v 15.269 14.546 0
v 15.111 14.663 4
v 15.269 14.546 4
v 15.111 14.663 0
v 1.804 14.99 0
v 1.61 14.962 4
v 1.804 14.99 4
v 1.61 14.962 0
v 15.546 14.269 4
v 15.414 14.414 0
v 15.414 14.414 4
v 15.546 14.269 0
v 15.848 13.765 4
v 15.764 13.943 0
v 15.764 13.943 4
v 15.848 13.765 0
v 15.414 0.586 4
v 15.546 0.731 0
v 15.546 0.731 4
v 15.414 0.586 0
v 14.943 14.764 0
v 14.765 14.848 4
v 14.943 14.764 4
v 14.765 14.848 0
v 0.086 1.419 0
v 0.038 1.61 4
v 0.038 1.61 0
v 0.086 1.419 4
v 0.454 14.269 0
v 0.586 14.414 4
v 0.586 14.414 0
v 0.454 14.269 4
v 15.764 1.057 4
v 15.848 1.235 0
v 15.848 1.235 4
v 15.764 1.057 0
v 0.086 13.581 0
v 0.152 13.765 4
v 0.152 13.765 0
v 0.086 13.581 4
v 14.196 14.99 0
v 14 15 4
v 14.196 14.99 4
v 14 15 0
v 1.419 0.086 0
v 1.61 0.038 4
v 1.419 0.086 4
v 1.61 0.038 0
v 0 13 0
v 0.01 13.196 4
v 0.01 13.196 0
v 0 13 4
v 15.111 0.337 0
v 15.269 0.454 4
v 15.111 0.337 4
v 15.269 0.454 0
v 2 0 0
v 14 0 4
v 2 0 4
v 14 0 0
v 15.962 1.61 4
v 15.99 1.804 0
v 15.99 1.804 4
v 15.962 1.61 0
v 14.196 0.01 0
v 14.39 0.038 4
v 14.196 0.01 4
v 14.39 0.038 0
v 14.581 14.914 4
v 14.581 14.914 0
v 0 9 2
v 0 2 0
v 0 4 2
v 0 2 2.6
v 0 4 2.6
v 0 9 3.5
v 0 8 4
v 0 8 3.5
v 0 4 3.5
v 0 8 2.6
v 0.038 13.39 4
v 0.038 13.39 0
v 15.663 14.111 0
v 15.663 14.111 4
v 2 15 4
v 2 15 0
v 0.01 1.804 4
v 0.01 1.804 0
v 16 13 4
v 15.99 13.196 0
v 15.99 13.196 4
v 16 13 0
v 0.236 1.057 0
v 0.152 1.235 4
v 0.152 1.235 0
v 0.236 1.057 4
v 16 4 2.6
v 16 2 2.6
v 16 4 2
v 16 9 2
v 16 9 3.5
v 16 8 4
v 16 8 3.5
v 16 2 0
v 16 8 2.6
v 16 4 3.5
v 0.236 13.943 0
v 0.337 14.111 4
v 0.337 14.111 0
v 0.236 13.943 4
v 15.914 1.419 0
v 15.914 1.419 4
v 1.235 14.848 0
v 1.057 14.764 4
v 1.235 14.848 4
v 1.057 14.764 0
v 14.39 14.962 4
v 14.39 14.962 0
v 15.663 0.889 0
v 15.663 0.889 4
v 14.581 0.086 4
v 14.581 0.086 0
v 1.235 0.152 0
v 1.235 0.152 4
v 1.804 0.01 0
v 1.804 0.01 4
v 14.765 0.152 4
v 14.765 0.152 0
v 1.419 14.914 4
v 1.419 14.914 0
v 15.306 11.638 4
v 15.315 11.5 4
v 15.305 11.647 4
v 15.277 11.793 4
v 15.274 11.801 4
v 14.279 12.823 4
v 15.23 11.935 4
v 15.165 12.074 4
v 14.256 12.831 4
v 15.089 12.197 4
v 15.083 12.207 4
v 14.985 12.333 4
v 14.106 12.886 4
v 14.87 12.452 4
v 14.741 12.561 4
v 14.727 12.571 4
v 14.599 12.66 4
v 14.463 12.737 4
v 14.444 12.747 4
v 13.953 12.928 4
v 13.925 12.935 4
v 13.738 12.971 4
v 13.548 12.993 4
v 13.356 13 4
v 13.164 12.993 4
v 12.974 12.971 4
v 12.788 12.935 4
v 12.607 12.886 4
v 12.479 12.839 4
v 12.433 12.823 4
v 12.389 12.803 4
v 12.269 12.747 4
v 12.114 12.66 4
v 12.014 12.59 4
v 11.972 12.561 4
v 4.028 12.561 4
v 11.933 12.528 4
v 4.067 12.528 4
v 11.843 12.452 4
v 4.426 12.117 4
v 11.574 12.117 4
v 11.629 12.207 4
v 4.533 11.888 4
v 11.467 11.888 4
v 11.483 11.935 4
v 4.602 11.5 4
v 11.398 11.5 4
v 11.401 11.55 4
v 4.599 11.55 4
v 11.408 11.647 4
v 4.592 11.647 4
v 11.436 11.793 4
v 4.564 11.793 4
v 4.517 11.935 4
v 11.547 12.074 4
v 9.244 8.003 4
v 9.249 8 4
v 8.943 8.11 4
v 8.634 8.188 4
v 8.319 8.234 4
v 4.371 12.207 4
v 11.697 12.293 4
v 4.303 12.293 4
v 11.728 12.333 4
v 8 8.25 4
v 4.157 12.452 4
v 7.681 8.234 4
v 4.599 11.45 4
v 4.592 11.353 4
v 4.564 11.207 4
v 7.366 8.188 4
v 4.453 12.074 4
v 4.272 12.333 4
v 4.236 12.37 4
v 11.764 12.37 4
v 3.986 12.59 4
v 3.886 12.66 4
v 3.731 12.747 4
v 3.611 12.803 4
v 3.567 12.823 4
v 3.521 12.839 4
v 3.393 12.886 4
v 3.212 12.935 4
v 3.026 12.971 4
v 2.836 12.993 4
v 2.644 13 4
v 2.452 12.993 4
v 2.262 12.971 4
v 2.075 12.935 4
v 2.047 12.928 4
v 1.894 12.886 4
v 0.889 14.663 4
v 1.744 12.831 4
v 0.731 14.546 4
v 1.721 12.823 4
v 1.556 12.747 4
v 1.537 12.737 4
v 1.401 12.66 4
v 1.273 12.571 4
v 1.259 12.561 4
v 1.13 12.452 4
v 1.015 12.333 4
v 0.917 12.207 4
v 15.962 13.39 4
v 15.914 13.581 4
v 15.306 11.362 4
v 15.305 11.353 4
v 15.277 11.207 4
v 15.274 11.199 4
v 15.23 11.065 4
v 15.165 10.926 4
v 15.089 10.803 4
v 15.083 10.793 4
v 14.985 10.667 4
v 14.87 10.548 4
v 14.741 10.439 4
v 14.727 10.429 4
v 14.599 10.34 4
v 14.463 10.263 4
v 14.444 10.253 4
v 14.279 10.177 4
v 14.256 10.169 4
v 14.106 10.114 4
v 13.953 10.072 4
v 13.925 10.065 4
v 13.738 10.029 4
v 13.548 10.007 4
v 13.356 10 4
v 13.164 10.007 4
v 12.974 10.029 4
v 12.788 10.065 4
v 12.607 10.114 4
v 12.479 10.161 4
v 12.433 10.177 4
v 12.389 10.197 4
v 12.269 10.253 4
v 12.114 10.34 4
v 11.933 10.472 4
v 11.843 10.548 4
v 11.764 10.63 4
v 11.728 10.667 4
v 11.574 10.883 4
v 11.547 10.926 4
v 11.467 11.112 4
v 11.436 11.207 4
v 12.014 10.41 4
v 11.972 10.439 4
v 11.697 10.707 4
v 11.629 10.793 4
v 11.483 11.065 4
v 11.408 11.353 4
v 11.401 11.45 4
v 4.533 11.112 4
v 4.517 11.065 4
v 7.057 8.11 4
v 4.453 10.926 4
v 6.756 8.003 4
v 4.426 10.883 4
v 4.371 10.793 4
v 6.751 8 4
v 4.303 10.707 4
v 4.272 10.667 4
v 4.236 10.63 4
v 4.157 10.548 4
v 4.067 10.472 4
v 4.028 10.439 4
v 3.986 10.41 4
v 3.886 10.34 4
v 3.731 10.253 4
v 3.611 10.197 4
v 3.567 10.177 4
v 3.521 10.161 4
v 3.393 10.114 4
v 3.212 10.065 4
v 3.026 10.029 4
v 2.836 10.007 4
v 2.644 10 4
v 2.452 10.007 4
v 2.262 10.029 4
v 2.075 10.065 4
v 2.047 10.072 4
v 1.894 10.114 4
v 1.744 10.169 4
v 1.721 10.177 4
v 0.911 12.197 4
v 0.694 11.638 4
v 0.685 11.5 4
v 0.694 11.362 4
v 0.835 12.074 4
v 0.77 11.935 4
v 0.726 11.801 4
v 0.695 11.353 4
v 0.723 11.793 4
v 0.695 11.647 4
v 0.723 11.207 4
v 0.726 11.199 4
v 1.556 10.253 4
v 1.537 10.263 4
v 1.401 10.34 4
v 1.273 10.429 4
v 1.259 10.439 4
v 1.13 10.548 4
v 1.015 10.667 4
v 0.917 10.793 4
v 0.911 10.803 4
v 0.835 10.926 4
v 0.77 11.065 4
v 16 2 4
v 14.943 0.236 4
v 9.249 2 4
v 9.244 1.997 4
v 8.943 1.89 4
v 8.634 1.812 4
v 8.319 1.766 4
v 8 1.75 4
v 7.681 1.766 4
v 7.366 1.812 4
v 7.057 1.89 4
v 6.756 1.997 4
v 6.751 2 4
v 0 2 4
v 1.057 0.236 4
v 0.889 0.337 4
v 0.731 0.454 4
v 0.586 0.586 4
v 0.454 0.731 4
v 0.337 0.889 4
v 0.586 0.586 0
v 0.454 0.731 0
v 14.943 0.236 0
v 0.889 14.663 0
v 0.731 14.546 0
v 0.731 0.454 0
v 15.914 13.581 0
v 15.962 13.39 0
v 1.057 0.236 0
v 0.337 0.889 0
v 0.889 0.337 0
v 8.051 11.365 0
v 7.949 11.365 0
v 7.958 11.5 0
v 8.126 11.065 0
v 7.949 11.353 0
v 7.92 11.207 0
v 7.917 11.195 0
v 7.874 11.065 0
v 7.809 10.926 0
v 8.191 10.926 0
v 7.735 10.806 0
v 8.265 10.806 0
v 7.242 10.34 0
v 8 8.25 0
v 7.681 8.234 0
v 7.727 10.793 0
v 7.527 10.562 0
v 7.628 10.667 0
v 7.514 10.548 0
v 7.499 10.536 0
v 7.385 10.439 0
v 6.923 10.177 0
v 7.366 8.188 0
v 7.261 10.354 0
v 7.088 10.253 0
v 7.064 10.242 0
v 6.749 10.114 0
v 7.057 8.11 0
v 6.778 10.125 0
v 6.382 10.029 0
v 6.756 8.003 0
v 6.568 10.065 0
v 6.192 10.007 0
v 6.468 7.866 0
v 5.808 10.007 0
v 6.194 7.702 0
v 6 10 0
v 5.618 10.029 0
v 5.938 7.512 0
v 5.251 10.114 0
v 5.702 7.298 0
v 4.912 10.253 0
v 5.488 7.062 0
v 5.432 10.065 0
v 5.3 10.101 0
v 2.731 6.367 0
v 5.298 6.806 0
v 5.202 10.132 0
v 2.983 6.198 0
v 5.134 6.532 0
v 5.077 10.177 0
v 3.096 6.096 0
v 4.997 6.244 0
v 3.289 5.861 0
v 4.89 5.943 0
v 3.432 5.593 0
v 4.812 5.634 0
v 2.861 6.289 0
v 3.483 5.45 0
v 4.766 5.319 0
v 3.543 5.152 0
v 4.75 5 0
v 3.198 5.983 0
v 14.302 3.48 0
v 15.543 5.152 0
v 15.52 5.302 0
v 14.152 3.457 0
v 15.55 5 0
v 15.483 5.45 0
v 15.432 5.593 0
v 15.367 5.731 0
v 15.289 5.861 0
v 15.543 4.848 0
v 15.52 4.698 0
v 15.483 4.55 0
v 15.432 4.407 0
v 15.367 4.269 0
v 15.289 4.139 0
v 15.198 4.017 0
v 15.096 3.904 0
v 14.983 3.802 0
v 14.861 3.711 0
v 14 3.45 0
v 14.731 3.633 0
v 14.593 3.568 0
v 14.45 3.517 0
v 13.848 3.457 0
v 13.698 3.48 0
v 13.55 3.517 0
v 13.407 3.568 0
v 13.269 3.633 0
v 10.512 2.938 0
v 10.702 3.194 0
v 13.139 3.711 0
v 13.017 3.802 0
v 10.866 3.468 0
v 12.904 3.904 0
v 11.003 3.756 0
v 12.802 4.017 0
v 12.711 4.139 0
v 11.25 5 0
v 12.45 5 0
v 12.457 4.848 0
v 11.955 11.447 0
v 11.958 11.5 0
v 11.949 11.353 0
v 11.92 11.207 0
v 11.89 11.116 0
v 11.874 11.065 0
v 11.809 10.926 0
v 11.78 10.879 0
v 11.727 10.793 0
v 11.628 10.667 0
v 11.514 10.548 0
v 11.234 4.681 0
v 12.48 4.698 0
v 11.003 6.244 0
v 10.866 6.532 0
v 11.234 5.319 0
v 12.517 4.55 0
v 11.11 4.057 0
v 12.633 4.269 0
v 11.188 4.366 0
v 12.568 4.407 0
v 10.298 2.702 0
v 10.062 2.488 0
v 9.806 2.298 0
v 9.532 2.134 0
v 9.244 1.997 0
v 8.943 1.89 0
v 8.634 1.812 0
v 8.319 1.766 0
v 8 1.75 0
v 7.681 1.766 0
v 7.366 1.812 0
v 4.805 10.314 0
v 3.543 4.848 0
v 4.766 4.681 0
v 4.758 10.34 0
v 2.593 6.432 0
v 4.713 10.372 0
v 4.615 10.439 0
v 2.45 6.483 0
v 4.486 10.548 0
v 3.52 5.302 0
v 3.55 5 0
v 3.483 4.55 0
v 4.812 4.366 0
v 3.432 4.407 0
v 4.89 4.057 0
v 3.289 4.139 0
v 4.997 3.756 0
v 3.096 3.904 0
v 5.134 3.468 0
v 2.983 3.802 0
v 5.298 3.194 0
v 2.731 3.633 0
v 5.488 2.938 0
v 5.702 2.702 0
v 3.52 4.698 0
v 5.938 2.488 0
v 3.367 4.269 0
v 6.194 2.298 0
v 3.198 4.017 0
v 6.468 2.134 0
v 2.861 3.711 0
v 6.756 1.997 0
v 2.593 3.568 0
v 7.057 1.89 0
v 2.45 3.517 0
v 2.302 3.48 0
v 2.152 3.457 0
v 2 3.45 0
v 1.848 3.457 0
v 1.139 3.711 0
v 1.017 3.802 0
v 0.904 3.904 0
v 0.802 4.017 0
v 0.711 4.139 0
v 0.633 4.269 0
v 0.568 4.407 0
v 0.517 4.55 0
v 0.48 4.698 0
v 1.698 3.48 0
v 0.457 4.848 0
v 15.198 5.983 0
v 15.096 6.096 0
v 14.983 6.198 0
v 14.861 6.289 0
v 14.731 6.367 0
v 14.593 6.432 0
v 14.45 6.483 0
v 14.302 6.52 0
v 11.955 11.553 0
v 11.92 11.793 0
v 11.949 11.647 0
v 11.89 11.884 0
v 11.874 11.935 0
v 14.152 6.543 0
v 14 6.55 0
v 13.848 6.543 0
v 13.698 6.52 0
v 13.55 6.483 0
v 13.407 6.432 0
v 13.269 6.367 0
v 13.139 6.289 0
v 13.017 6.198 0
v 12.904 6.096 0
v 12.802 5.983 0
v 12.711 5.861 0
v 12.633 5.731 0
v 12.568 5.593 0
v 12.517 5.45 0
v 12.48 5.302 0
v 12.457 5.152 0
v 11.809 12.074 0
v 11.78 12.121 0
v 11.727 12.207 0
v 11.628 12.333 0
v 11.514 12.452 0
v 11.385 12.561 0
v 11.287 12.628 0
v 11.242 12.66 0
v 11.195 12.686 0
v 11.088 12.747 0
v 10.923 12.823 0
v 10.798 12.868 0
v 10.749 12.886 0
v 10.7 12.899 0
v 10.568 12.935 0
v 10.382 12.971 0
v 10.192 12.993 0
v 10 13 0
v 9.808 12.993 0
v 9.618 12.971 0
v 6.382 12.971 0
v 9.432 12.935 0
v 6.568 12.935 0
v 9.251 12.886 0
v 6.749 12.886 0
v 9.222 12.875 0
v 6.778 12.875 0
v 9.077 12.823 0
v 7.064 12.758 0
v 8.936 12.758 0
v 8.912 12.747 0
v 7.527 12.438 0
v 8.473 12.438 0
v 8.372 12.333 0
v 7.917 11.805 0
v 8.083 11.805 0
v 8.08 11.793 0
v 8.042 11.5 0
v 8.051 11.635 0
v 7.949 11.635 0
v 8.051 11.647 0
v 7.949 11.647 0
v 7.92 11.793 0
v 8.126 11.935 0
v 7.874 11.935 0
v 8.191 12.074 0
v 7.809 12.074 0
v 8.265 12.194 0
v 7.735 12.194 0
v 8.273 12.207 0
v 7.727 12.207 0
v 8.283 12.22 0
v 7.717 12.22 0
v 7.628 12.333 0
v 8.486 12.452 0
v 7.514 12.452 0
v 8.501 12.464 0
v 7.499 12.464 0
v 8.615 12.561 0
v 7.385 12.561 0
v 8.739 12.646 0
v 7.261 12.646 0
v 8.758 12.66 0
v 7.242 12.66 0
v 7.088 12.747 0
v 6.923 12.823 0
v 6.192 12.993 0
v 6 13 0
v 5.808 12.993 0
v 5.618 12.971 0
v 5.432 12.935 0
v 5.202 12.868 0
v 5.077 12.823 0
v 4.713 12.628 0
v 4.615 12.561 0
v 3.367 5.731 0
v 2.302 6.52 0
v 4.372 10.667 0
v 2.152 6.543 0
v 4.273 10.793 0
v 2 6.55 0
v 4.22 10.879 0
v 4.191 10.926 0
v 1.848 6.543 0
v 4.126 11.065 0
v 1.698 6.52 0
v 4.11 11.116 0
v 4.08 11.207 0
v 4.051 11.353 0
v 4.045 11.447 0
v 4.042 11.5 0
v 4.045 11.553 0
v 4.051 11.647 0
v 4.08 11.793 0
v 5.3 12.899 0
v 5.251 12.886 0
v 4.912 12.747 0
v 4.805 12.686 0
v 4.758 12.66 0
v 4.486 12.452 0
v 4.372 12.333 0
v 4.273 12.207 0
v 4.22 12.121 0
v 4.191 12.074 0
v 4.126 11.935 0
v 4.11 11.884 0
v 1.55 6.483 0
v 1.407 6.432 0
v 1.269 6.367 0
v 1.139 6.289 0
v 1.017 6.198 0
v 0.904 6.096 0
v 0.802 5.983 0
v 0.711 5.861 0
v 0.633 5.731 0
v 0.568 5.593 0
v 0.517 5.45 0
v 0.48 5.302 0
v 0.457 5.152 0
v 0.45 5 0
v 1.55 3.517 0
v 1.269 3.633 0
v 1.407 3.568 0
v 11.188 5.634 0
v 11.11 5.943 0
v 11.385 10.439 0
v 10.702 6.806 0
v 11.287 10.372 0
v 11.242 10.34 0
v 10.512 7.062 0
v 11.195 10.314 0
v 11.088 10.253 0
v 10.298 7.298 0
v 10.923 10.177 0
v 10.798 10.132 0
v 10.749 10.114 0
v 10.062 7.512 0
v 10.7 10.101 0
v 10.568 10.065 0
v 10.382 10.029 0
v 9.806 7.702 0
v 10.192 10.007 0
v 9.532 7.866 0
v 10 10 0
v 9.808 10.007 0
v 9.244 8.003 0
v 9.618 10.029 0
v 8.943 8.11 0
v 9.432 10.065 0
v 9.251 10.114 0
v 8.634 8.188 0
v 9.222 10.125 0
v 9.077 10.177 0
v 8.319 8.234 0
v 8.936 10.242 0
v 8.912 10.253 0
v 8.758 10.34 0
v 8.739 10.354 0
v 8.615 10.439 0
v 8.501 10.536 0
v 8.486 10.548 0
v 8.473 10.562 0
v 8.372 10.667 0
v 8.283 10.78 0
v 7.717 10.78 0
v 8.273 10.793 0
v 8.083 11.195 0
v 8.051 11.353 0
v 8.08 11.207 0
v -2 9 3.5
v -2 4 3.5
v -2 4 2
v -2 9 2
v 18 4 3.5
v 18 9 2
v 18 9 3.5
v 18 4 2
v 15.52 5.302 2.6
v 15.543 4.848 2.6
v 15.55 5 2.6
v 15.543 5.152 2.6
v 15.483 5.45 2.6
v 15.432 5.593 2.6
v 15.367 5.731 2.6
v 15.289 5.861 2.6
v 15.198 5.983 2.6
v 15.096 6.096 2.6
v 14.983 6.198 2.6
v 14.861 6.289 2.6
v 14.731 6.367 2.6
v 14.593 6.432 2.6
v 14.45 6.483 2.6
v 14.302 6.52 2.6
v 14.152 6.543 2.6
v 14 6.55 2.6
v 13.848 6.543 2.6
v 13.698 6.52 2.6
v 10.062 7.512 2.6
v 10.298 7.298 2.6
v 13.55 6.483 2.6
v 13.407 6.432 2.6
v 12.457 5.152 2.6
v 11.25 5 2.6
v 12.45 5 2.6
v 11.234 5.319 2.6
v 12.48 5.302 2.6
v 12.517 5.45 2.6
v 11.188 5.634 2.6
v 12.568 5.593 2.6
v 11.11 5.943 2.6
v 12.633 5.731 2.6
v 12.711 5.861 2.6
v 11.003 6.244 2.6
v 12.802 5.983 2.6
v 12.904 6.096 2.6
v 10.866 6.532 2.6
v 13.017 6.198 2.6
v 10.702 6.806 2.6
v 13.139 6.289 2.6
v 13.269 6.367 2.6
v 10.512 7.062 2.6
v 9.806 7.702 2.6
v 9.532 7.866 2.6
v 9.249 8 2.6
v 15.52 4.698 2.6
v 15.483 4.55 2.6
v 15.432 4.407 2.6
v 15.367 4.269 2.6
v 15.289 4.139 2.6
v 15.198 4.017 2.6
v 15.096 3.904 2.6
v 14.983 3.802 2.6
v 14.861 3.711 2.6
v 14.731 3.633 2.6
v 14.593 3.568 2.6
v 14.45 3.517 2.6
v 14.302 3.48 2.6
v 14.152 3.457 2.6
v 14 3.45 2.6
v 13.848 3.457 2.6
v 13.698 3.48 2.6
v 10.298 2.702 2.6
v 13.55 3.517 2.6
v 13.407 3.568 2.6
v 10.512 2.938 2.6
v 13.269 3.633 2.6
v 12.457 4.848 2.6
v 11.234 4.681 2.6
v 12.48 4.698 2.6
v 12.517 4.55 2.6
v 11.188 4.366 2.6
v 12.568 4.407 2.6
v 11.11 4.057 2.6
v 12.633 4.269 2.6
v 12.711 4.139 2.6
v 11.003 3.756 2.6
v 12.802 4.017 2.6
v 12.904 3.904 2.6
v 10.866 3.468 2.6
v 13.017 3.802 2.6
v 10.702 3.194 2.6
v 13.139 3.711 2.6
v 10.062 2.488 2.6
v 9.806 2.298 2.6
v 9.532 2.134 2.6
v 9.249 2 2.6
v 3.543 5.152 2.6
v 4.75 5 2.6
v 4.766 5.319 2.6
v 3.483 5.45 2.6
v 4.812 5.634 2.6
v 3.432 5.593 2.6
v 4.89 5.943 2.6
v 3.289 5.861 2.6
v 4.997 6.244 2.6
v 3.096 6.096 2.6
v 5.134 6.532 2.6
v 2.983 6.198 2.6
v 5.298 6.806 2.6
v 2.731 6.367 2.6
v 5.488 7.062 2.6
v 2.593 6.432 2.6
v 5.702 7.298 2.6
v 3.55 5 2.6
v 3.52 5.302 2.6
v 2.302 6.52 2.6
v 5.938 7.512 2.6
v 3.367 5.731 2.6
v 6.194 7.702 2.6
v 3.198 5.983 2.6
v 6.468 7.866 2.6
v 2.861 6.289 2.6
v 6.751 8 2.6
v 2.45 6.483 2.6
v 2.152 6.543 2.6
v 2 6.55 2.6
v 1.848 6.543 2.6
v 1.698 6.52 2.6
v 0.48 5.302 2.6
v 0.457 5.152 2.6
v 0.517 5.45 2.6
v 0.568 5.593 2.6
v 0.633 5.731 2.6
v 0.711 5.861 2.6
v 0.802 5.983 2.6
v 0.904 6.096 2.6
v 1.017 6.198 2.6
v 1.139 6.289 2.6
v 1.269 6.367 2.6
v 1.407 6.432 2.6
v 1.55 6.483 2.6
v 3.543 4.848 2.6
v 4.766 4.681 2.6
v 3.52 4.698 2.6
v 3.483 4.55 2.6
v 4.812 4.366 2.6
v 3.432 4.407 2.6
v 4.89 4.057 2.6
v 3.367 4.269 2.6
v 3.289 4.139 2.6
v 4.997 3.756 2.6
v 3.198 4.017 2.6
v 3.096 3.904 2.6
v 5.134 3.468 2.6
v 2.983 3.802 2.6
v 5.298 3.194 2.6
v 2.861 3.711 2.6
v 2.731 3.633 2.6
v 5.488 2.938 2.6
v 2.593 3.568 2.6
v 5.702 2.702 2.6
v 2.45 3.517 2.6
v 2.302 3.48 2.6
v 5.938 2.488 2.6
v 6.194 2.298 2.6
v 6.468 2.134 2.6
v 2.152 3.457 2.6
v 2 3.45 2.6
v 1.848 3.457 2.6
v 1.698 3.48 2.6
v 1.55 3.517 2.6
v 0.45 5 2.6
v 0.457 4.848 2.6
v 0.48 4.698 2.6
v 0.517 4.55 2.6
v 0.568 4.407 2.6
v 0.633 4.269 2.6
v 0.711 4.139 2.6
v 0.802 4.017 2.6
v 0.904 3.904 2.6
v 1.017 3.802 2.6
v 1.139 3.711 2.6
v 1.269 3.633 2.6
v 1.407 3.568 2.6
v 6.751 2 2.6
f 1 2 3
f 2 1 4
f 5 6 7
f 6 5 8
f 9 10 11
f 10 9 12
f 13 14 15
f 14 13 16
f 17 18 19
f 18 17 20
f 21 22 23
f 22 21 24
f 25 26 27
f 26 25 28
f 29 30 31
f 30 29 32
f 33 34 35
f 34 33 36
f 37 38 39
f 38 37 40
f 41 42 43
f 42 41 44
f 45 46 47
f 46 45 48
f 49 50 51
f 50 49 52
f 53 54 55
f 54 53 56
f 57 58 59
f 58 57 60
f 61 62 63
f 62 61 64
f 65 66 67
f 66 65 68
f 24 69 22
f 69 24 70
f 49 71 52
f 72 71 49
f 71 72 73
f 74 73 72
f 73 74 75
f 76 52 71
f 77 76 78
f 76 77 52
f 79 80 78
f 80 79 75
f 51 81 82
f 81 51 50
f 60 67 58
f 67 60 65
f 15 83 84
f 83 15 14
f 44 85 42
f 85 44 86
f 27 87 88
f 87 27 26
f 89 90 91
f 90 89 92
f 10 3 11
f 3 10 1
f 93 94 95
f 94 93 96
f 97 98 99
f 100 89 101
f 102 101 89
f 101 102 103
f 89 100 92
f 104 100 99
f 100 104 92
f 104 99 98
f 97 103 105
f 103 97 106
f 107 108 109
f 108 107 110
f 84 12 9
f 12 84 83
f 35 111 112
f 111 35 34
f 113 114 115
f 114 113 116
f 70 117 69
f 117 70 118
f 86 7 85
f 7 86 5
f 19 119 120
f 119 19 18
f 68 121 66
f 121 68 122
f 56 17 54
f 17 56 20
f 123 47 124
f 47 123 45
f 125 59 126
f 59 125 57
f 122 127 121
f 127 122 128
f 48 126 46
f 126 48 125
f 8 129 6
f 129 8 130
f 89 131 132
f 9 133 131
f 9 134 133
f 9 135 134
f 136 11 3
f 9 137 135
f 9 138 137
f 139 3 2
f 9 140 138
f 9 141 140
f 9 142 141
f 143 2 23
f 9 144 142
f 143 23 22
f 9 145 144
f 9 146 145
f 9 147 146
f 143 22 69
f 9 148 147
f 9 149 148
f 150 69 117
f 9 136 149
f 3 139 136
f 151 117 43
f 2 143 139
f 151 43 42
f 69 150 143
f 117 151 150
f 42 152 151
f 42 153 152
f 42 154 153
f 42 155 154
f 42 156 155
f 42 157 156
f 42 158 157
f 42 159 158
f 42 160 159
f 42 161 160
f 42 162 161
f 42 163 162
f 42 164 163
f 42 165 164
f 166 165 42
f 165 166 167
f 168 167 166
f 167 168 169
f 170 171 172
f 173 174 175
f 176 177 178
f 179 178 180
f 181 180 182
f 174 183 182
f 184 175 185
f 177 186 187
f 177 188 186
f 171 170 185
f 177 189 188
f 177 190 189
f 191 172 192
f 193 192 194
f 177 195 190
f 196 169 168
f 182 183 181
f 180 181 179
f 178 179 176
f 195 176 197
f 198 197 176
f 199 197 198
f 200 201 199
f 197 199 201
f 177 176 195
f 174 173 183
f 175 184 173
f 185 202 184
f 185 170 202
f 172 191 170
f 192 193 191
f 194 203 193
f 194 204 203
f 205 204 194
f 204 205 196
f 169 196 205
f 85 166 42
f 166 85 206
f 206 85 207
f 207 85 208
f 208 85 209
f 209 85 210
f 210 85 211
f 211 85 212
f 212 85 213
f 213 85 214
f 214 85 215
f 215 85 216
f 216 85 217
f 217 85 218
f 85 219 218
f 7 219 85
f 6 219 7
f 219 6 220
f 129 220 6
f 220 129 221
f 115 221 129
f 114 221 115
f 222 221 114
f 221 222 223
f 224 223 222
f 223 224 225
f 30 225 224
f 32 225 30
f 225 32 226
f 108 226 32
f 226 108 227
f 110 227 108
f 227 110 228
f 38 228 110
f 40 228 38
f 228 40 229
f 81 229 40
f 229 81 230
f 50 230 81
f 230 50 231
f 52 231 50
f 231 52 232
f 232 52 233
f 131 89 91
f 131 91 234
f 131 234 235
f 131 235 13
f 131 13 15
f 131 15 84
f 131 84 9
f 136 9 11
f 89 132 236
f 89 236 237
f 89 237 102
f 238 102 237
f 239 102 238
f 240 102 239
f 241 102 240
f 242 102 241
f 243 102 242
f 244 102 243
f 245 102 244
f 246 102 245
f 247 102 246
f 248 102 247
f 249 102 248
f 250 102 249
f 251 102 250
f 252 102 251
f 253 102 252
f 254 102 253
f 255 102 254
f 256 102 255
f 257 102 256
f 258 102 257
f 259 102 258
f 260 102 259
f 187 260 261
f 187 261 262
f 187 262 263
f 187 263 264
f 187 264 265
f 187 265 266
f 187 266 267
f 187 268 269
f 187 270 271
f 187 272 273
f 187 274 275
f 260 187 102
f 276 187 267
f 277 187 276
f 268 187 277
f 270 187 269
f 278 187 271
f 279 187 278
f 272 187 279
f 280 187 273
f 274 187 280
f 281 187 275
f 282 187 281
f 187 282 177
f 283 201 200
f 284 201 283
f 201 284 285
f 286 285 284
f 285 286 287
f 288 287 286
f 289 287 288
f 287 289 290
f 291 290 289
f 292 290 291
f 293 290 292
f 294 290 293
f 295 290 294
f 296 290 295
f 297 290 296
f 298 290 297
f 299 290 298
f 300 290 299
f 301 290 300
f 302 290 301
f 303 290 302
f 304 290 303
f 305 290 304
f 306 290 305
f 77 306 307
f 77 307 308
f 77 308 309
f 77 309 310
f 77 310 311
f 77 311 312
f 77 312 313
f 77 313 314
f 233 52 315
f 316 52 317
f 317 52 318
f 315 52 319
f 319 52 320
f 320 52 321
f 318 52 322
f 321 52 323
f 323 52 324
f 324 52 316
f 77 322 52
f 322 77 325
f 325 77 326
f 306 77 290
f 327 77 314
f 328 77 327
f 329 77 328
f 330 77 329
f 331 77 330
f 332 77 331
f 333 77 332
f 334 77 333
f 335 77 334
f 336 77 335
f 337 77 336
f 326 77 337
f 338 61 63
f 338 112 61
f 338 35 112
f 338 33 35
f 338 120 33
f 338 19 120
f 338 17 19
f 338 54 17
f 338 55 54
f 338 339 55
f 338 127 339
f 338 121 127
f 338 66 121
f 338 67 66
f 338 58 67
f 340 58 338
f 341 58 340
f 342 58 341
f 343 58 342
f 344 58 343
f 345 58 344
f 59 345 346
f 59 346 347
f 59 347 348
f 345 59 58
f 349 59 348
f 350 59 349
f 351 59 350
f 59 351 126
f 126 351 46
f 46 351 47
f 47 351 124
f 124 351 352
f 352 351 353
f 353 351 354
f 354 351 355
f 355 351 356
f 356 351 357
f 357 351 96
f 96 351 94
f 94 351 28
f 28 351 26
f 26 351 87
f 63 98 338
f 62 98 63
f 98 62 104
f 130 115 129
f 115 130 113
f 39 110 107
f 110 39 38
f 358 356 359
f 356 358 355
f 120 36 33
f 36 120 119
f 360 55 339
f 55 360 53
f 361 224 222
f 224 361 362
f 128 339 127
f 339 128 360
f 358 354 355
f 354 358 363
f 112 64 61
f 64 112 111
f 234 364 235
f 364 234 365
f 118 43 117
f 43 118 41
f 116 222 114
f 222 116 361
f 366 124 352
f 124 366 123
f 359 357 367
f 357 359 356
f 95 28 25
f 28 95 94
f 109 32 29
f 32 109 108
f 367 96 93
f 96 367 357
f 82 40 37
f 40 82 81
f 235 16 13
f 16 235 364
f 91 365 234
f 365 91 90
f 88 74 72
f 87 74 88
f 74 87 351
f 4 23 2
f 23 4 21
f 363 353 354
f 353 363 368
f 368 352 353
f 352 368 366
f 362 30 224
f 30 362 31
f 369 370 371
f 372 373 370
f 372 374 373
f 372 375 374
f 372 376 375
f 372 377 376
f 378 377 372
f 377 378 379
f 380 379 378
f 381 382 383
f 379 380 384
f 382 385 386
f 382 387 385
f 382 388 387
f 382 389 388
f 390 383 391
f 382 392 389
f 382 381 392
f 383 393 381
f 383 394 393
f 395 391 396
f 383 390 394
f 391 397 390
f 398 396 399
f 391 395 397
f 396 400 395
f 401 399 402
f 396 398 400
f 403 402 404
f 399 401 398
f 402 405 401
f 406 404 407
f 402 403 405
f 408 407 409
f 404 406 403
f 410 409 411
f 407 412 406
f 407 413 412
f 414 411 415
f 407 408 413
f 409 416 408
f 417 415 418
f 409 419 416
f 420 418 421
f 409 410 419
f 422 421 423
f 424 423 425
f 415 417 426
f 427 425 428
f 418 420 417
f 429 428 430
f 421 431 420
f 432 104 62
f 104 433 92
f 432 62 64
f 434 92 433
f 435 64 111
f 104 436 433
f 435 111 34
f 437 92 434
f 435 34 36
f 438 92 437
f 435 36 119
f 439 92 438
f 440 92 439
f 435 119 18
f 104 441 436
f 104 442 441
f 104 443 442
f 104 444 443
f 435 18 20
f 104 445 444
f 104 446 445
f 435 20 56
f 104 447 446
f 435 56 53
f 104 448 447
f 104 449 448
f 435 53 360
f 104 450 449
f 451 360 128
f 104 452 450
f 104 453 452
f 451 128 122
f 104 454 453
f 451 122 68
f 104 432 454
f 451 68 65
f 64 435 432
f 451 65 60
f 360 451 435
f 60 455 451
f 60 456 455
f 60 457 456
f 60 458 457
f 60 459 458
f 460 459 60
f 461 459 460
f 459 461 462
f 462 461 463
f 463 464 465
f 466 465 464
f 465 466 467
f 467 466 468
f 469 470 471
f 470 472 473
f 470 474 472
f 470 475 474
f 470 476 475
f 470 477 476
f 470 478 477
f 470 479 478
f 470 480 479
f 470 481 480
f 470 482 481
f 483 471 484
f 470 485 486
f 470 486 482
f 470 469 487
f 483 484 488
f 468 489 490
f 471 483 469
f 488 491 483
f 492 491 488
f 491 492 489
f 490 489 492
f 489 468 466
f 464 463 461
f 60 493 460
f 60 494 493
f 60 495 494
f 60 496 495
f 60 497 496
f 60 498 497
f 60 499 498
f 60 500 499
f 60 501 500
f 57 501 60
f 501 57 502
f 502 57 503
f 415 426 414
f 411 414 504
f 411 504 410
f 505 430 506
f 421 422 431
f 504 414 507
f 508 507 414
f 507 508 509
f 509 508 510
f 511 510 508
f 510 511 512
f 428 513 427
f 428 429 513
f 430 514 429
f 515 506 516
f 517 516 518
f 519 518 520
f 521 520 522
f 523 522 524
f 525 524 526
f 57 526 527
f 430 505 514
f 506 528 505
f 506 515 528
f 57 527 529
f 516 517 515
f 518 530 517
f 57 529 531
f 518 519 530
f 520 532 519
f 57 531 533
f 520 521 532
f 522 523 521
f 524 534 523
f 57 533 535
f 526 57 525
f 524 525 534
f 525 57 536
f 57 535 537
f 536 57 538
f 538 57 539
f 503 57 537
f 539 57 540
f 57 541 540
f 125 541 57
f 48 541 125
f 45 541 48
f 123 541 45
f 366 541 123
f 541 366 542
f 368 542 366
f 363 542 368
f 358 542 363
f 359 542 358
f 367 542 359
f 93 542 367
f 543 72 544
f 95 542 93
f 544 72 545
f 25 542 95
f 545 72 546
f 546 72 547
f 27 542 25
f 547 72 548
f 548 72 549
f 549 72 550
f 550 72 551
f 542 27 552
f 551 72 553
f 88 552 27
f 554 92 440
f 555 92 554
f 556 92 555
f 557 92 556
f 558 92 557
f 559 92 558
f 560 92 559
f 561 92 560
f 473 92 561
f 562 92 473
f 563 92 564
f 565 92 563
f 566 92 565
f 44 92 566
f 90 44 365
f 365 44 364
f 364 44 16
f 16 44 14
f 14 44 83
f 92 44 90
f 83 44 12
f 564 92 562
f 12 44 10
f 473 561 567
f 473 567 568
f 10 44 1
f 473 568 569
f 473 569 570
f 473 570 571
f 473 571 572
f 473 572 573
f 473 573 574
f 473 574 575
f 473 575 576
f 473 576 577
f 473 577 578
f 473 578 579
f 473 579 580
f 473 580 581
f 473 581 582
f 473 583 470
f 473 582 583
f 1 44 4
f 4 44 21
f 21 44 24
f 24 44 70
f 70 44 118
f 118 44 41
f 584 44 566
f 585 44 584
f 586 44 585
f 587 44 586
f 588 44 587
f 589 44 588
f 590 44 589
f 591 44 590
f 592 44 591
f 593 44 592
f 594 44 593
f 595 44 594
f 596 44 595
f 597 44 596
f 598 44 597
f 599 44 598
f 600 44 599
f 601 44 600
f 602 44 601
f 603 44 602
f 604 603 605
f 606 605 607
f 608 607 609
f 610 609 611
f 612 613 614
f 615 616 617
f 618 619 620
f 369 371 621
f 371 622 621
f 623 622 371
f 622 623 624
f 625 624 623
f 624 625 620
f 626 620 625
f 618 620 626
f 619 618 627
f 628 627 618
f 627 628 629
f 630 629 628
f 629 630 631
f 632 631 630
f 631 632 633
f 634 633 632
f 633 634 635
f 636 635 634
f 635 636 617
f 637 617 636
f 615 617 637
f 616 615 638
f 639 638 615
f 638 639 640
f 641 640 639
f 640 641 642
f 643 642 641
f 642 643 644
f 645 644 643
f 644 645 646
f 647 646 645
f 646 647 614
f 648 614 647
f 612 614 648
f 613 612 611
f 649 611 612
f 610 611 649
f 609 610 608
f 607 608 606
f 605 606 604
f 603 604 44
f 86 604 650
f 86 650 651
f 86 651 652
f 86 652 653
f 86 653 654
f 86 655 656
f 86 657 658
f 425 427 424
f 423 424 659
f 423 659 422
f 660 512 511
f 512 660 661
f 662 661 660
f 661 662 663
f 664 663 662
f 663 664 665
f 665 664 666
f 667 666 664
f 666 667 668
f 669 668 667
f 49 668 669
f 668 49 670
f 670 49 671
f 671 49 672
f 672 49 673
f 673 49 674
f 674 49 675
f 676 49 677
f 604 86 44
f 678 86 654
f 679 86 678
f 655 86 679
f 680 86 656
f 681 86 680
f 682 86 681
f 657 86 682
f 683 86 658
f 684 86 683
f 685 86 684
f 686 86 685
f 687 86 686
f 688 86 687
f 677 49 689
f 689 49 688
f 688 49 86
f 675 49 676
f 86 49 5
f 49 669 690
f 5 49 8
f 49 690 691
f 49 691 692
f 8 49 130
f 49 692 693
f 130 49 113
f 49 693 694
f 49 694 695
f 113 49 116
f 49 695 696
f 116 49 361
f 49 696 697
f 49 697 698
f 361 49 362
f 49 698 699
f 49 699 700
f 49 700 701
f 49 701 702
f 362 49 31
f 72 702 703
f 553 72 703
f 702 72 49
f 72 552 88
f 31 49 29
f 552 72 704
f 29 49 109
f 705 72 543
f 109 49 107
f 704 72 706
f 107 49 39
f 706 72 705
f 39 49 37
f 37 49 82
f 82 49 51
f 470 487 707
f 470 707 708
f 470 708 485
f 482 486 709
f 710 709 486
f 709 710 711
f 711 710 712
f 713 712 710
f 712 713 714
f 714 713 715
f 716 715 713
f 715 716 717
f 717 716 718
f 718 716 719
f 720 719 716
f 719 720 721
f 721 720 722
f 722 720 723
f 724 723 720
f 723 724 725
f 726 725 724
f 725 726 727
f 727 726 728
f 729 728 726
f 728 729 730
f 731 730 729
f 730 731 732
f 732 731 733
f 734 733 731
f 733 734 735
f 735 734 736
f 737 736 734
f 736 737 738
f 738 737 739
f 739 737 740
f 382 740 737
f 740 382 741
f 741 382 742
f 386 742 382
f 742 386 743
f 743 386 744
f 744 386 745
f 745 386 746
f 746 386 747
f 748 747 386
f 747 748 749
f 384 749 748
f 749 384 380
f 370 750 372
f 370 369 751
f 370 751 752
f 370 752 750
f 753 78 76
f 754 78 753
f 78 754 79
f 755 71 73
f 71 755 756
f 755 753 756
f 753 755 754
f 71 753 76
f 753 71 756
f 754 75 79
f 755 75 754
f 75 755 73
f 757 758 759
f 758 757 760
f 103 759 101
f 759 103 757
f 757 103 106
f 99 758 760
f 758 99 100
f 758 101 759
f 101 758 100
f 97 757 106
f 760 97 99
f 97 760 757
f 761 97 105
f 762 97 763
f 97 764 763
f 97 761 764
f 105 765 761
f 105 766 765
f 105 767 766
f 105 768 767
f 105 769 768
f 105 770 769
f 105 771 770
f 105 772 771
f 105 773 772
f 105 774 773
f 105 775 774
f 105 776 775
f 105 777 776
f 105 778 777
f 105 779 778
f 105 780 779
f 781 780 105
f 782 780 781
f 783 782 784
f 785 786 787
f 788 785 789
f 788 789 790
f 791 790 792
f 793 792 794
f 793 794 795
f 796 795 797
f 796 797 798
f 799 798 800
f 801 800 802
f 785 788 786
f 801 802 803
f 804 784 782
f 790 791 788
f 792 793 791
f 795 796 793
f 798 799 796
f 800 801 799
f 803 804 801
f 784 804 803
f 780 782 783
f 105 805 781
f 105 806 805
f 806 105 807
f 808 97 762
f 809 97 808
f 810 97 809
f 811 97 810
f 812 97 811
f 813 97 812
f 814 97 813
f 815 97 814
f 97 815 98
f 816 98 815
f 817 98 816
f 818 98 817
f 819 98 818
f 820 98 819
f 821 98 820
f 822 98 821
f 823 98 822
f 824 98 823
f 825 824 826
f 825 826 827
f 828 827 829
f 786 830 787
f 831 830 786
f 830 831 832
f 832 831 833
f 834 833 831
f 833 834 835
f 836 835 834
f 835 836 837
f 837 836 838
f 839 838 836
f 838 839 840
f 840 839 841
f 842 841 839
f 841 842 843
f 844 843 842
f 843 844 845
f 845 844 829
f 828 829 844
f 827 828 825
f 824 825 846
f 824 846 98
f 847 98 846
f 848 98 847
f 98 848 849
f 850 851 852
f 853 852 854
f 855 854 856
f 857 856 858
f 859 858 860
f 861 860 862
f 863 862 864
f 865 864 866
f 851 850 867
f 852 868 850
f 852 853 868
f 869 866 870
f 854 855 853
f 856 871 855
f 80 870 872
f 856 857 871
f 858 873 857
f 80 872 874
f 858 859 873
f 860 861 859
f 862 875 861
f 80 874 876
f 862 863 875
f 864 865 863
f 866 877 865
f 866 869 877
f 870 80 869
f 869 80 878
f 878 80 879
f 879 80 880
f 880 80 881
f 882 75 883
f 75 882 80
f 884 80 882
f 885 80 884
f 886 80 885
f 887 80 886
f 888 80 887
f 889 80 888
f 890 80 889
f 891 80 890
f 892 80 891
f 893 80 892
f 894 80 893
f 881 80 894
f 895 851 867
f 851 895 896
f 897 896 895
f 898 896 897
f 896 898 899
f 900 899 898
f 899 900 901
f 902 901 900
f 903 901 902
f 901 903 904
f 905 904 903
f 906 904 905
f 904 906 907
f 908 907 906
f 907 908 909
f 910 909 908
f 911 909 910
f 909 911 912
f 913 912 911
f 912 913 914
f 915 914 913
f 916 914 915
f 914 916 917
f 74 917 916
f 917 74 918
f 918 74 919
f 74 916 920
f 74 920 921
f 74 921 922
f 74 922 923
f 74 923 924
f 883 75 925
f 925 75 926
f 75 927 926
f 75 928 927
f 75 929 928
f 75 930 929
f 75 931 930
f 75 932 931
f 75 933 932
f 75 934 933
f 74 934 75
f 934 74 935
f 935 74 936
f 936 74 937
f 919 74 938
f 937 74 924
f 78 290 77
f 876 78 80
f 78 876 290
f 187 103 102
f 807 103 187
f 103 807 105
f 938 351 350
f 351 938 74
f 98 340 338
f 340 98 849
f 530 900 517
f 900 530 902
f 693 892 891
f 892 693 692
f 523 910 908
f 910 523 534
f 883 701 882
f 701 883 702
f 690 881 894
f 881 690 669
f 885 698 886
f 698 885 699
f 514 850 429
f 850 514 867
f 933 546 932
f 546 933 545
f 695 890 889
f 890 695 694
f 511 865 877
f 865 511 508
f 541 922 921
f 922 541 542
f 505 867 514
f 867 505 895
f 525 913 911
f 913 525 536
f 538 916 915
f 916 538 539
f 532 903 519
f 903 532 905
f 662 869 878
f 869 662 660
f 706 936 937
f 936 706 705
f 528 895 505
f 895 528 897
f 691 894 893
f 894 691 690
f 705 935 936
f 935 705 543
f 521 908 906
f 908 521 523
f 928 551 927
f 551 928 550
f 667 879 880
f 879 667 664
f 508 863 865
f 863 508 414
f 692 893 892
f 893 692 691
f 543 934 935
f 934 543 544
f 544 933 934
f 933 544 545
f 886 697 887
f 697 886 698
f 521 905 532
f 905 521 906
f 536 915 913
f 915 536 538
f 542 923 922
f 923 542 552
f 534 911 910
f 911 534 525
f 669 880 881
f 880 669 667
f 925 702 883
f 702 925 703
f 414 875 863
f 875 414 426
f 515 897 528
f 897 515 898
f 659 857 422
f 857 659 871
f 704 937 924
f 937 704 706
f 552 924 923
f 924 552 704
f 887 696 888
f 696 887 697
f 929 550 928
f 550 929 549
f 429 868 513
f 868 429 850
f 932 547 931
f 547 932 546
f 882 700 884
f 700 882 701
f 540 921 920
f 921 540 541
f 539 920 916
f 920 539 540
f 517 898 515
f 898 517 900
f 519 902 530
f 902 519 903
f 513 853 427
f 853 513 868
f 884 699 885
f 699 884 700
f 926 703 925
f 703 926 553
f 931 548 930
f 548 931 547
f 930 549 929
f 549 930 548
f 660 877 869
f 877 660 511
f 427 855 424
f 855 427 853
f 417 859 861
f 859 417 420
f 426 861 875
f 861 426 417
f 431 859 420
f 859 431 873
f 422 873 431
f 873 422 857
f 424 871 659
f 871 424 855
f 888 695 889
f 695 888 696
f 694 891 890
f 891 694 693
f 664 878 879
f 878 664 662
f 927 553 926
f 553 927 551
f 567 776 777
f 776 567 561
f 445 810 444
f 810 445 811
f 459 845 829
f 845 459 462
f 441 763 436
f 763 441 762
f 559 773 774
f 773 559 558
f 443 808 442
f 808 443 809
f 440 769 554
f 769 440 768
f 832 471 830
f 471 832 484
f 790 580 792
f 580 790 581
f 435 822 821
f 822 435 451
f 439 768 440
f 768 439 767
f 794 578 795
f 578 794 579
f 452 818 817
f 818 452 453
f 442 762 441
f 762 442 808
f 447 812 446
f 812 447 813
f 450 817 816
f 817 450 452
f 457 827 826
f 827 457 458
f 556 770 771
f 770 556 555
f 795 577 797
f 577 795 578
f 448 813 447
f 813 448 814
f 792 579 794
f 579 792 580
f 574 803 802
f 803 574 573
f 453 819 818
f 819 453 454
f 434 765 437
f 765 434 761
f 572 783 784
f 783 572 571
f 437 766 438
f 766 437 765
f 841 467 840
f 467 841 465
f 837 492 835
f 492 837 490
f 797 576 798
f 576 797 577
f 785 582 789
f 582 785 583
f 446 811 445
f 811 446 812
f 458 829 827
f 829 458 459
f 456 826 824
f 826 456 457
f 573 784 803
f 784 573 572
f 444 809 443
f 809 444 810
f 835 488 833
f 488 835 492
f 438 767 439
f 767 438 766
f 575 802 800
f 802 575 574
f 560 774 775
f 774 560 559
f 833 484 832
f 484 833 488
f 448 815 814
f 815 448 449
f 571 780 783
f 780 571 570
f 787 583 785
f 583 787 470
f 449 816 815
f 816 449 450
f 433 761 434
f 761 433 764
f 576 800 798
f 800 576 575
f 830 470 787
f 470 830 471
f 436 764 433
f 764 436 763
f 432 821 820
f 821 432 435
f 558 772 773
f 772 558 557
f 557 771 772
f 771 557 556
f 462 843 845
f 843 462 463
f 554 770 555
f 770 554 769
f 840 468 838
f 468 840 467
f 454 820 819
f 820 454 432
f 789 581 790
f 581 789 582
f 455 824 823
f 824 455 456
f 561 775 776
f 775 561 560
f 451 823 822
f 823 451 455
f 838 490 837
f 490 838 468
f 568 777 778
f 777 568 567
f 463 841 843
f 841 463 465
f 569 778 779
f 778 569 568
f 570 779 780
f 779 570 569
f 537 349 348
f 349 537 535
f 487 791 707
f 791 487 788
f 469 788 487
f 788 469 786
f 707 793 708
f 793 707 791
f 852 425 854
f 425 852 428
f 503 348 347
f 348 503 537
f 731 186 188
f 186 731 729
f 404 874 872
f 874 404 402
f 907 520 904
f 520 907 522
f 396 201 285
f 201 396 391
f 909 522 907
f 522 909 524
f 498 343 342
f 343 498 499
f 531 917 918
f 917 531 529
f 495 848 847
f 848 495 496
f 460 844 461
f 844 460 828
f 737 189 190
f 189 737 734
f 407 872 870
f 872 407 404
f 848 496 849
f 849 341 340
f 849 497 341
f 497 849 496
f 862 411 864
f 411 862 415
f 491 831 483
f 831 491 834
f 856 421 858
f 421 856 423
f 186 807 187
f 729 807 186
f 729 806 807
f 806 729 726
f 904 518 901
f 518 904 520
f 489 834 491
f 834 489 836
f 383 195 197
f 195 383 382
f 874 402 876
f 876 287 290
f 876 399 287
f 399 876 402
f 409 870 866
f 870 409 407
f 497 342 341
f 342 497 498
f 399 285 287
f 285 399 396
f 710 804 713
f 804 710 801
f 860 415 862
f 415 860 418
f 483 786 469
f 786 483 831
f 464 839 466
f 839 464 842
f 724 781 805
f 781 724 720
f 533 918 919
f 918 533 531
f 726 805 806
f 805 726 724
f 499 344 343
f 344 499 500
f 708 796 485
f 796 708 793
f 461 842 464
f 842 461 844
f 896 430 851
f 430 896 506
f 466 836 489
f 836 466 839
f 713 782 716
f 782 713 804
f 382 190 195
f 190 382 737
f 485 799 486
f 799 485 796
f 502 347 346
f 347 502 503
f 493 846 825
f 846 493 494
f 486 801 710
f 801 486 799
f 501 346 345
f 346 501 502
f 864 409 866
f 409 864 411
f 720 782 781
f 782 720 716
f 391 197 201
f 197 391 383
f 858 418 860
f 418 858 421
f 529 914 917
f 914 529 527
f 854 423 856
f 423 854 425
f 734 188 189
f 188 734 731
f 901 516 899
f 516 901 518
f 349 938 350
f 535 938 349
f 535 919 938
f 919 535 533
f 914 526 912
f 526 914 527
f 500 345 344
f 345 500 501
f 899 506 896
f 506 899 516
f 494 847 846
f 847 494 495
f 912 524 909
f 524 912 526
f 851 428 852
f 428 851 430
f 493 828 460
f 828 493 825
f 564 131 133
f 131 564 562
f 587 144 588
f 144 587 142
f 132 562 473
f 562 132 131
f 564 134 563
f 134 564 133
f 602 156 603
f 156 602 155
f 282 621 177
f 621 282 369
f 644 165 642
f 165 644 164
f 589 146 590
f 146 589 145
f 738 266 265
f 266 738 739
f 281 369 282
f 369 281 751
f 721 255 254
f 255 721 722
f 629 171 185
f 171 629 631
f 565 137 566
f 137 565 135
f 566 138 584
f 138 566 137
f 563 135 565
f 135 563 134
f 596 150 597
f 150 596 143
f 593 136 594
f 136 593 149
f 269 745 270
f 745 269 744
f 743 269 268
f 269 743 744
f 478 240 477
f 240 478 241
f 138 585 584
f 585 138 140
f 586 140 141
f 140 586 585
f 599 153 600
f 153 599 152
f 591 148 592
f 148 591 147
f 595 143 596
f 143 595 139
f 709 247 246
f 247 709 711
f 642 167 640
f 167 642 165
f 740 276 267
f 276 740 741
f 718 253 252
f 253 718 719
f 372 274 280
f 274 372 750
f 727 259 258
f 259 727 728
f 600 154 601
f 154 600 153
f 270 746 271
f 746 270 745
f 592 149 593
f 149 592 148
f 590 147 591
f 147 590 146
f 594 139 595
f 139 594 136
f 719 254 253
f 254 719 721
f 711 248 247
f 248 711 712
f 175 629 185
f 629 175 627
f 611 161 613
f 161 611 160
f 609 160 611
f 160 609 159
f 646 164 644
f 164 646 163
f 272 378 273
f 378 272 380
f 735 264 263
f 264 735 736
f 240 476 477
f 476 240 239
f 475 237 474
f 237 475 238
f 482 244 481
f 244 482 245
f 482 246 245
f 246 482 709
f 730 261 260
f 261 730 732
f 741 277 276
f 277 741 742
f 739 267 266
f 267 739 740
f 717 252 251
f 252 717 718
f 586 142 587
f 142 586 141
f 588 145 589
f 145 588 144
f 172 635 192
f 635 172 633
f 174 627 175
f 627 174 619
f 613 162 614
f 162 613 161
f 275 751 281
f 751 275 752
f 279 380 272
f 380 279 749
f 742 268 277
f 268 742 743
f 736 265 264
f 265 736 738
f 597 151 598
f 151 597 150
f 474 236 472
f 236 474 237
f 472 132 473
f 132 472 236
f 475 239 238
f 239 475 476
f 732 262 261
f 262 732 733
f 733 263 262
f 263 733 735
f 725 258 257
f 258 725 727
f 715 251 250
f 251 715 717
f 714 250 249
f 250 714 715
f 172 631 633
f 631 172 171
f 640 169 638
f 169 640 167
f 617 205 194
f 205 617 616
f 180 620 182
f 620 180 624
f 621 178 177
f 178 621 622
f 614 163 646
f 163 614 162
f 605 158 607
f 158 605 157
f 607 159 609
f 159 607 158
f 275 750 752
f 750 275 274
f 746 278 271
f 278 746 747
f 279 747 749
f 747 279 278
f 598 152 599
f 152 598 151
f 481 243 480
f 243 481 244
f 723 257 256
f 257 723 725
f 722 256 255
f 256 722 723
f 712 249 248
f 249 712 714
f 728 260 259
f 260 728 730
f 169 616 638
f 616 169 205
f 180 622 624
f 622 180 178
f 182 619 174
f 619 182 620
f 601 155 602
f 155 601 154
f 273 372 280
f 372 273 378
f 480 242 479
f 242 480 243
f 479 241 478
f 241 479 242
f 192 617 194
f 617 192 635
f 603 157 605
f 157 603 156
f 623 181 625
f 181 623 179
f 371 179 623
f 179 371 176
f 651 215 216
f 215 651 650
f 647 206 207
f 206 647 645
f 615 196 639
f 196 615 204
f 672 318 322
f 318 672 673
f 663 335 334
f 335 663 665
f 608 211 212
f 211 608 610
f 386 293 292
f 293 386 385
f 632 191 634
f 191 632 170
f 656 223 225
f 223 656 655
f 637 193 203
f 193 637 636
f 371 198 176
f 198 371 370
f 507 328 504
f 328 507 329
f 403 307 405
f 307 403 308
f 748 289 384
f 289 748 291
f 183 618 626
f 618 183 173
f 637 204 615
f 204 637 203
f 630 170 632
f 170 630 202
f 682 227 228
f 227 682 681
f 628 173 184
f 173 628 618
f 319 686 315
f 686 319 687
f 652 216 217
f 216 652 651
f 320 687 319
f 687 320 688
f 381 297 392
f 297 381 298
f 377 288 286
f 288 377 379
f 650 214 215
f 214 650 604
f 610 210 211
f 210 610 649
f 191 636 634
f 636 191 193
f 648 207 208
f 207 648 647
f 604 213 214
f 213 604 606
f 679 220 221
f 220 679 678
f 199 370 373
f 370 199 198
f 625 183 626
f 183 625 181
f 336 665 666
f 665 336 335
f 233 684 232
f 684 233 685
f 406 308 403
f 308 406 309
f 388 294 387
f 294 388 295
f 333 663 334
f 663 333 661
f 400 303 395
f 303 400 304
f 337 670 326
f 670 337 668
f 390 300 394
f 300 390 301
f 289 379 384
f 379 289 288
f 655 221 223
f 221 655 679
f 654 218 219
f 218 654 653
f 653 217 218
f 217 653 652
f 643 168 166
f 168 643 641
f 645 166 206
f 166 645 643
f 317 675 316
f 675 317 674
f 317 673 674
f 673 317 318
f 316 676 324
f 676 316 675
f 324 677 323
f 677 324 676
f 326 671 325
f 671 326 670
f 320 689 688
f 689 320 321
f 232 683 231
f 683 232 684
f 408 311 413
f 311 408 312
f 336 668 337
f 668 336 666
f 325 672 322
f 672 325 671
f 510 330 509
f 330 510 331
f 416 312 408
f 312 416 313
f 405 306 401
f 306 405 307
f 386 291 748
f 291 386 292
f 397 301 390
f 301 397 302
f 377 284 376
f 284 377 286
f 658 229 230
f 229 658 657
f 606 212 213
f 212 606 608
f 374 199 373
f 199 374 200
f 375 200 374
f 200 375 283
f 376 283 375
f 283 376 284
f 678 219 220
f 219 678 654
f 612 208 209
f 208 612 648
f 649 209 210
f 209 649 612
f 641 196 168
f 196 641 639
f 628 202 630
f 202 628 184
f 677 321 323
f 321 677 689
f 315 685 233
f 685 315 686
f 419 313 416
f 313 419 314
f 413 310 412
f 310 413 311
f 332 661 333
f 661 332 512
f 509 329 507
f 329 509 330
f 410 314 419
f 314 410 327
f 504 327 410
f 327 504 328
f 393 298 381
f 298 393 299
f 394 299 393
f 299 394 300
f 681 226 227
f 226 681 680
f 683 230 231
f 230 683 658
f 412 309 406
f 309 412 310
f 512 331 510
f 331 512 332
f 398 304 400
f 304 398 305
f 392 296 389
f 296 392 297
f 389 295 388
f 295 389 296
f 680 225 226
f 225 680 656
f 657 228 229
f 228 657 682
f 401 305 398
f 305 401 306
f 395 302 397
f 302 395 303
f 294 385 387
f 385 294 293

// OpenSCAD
// file: ../Universal/SCAD/rounded_box.scad
/**
 * Small "library" for creating boxes with rounded edges.
 *
 * Hendrik Busch, 2017 (https://github.com/hmbusch)
 *
 */
 
/**
 * Call to create a box with rounded edges (edges will be round on one plane only).
 * Be sure to increase $fn for nicer edges.
 * 
 * @param width
 *          the desired width of the box (default is 10mm)
 * @param depth
 *          the desired depth of the box (default is 10mm)
 * @param height
 *          the desired height of the box (default is 10mm)
 * @param edge_radius
 *          the radius of all the edges on the xy-plane (default is 2mm)
 *
 */
module box_with_round_edges(width = 10, depth = 10, height = 10, edge_radius = 2) {
    translate([edge_radius, edge_radius, 0]) hull() {
        ed = edge_radius * 2;
        cylinder(d = ed, h = height);
        translate([width - ed, 0, 0]) cylinder(d = edge_radius * 2, h = height);
        translate([0, depth - ed, 0]) cylinder(d = edge_radius * 2, h = height);
        translate([width - ed, depth -ed, 0]) cylinder(d = edge_radius * 2, h = height);
    }
}
// main file
use <../Universal/SCAD/rounded_box.scad>

$fn = 64;

module plate() {
    difference() {
        union() {
            box_with_round_edges(width = 16, depth = 15, height = 4, edge_radius = 2);
            // Mounting fins
            translate([-2, 4, 2]) cube([2, 5, 1.5]);
            translate([16, 4, 2]) cube([2, 5, 1.5]);
        }
        
        // cutout for SMA bracket
        translate([0, 2, 2.6]) cube([16, 6, 1.4]);
        // holes for mounting screws
        hull() {
            //translate([1.8, 5, 0]) cylinder(d = 3.1, h = 5);
            translate([2, 5, 0]) cylinder(d = 3.1, h = 5);
        }
        hull() {
            translate([14, 5, 0]) cylinder(d = 3.1, h = 5);
            //translate([14.2, 5, 0]) cylinder(d = 3.1, h = 5);
        }
        // hole for SMA connector
        translate([8, 5, 0]) cylinder(d = 6.5, h = 5);
        
        // hole for rx antennas
        translate([10, 11.5, 0]) rotate([0, 40, 0]) translate([0, 0, -2]) cylinder(d = 3, h = 9);
        translate([6, 11.5, 0]) rotate([0, -40, 0]) translate([0, 0, -2]) cylinder(d = 3, h = 9);
    }
}


plate();
